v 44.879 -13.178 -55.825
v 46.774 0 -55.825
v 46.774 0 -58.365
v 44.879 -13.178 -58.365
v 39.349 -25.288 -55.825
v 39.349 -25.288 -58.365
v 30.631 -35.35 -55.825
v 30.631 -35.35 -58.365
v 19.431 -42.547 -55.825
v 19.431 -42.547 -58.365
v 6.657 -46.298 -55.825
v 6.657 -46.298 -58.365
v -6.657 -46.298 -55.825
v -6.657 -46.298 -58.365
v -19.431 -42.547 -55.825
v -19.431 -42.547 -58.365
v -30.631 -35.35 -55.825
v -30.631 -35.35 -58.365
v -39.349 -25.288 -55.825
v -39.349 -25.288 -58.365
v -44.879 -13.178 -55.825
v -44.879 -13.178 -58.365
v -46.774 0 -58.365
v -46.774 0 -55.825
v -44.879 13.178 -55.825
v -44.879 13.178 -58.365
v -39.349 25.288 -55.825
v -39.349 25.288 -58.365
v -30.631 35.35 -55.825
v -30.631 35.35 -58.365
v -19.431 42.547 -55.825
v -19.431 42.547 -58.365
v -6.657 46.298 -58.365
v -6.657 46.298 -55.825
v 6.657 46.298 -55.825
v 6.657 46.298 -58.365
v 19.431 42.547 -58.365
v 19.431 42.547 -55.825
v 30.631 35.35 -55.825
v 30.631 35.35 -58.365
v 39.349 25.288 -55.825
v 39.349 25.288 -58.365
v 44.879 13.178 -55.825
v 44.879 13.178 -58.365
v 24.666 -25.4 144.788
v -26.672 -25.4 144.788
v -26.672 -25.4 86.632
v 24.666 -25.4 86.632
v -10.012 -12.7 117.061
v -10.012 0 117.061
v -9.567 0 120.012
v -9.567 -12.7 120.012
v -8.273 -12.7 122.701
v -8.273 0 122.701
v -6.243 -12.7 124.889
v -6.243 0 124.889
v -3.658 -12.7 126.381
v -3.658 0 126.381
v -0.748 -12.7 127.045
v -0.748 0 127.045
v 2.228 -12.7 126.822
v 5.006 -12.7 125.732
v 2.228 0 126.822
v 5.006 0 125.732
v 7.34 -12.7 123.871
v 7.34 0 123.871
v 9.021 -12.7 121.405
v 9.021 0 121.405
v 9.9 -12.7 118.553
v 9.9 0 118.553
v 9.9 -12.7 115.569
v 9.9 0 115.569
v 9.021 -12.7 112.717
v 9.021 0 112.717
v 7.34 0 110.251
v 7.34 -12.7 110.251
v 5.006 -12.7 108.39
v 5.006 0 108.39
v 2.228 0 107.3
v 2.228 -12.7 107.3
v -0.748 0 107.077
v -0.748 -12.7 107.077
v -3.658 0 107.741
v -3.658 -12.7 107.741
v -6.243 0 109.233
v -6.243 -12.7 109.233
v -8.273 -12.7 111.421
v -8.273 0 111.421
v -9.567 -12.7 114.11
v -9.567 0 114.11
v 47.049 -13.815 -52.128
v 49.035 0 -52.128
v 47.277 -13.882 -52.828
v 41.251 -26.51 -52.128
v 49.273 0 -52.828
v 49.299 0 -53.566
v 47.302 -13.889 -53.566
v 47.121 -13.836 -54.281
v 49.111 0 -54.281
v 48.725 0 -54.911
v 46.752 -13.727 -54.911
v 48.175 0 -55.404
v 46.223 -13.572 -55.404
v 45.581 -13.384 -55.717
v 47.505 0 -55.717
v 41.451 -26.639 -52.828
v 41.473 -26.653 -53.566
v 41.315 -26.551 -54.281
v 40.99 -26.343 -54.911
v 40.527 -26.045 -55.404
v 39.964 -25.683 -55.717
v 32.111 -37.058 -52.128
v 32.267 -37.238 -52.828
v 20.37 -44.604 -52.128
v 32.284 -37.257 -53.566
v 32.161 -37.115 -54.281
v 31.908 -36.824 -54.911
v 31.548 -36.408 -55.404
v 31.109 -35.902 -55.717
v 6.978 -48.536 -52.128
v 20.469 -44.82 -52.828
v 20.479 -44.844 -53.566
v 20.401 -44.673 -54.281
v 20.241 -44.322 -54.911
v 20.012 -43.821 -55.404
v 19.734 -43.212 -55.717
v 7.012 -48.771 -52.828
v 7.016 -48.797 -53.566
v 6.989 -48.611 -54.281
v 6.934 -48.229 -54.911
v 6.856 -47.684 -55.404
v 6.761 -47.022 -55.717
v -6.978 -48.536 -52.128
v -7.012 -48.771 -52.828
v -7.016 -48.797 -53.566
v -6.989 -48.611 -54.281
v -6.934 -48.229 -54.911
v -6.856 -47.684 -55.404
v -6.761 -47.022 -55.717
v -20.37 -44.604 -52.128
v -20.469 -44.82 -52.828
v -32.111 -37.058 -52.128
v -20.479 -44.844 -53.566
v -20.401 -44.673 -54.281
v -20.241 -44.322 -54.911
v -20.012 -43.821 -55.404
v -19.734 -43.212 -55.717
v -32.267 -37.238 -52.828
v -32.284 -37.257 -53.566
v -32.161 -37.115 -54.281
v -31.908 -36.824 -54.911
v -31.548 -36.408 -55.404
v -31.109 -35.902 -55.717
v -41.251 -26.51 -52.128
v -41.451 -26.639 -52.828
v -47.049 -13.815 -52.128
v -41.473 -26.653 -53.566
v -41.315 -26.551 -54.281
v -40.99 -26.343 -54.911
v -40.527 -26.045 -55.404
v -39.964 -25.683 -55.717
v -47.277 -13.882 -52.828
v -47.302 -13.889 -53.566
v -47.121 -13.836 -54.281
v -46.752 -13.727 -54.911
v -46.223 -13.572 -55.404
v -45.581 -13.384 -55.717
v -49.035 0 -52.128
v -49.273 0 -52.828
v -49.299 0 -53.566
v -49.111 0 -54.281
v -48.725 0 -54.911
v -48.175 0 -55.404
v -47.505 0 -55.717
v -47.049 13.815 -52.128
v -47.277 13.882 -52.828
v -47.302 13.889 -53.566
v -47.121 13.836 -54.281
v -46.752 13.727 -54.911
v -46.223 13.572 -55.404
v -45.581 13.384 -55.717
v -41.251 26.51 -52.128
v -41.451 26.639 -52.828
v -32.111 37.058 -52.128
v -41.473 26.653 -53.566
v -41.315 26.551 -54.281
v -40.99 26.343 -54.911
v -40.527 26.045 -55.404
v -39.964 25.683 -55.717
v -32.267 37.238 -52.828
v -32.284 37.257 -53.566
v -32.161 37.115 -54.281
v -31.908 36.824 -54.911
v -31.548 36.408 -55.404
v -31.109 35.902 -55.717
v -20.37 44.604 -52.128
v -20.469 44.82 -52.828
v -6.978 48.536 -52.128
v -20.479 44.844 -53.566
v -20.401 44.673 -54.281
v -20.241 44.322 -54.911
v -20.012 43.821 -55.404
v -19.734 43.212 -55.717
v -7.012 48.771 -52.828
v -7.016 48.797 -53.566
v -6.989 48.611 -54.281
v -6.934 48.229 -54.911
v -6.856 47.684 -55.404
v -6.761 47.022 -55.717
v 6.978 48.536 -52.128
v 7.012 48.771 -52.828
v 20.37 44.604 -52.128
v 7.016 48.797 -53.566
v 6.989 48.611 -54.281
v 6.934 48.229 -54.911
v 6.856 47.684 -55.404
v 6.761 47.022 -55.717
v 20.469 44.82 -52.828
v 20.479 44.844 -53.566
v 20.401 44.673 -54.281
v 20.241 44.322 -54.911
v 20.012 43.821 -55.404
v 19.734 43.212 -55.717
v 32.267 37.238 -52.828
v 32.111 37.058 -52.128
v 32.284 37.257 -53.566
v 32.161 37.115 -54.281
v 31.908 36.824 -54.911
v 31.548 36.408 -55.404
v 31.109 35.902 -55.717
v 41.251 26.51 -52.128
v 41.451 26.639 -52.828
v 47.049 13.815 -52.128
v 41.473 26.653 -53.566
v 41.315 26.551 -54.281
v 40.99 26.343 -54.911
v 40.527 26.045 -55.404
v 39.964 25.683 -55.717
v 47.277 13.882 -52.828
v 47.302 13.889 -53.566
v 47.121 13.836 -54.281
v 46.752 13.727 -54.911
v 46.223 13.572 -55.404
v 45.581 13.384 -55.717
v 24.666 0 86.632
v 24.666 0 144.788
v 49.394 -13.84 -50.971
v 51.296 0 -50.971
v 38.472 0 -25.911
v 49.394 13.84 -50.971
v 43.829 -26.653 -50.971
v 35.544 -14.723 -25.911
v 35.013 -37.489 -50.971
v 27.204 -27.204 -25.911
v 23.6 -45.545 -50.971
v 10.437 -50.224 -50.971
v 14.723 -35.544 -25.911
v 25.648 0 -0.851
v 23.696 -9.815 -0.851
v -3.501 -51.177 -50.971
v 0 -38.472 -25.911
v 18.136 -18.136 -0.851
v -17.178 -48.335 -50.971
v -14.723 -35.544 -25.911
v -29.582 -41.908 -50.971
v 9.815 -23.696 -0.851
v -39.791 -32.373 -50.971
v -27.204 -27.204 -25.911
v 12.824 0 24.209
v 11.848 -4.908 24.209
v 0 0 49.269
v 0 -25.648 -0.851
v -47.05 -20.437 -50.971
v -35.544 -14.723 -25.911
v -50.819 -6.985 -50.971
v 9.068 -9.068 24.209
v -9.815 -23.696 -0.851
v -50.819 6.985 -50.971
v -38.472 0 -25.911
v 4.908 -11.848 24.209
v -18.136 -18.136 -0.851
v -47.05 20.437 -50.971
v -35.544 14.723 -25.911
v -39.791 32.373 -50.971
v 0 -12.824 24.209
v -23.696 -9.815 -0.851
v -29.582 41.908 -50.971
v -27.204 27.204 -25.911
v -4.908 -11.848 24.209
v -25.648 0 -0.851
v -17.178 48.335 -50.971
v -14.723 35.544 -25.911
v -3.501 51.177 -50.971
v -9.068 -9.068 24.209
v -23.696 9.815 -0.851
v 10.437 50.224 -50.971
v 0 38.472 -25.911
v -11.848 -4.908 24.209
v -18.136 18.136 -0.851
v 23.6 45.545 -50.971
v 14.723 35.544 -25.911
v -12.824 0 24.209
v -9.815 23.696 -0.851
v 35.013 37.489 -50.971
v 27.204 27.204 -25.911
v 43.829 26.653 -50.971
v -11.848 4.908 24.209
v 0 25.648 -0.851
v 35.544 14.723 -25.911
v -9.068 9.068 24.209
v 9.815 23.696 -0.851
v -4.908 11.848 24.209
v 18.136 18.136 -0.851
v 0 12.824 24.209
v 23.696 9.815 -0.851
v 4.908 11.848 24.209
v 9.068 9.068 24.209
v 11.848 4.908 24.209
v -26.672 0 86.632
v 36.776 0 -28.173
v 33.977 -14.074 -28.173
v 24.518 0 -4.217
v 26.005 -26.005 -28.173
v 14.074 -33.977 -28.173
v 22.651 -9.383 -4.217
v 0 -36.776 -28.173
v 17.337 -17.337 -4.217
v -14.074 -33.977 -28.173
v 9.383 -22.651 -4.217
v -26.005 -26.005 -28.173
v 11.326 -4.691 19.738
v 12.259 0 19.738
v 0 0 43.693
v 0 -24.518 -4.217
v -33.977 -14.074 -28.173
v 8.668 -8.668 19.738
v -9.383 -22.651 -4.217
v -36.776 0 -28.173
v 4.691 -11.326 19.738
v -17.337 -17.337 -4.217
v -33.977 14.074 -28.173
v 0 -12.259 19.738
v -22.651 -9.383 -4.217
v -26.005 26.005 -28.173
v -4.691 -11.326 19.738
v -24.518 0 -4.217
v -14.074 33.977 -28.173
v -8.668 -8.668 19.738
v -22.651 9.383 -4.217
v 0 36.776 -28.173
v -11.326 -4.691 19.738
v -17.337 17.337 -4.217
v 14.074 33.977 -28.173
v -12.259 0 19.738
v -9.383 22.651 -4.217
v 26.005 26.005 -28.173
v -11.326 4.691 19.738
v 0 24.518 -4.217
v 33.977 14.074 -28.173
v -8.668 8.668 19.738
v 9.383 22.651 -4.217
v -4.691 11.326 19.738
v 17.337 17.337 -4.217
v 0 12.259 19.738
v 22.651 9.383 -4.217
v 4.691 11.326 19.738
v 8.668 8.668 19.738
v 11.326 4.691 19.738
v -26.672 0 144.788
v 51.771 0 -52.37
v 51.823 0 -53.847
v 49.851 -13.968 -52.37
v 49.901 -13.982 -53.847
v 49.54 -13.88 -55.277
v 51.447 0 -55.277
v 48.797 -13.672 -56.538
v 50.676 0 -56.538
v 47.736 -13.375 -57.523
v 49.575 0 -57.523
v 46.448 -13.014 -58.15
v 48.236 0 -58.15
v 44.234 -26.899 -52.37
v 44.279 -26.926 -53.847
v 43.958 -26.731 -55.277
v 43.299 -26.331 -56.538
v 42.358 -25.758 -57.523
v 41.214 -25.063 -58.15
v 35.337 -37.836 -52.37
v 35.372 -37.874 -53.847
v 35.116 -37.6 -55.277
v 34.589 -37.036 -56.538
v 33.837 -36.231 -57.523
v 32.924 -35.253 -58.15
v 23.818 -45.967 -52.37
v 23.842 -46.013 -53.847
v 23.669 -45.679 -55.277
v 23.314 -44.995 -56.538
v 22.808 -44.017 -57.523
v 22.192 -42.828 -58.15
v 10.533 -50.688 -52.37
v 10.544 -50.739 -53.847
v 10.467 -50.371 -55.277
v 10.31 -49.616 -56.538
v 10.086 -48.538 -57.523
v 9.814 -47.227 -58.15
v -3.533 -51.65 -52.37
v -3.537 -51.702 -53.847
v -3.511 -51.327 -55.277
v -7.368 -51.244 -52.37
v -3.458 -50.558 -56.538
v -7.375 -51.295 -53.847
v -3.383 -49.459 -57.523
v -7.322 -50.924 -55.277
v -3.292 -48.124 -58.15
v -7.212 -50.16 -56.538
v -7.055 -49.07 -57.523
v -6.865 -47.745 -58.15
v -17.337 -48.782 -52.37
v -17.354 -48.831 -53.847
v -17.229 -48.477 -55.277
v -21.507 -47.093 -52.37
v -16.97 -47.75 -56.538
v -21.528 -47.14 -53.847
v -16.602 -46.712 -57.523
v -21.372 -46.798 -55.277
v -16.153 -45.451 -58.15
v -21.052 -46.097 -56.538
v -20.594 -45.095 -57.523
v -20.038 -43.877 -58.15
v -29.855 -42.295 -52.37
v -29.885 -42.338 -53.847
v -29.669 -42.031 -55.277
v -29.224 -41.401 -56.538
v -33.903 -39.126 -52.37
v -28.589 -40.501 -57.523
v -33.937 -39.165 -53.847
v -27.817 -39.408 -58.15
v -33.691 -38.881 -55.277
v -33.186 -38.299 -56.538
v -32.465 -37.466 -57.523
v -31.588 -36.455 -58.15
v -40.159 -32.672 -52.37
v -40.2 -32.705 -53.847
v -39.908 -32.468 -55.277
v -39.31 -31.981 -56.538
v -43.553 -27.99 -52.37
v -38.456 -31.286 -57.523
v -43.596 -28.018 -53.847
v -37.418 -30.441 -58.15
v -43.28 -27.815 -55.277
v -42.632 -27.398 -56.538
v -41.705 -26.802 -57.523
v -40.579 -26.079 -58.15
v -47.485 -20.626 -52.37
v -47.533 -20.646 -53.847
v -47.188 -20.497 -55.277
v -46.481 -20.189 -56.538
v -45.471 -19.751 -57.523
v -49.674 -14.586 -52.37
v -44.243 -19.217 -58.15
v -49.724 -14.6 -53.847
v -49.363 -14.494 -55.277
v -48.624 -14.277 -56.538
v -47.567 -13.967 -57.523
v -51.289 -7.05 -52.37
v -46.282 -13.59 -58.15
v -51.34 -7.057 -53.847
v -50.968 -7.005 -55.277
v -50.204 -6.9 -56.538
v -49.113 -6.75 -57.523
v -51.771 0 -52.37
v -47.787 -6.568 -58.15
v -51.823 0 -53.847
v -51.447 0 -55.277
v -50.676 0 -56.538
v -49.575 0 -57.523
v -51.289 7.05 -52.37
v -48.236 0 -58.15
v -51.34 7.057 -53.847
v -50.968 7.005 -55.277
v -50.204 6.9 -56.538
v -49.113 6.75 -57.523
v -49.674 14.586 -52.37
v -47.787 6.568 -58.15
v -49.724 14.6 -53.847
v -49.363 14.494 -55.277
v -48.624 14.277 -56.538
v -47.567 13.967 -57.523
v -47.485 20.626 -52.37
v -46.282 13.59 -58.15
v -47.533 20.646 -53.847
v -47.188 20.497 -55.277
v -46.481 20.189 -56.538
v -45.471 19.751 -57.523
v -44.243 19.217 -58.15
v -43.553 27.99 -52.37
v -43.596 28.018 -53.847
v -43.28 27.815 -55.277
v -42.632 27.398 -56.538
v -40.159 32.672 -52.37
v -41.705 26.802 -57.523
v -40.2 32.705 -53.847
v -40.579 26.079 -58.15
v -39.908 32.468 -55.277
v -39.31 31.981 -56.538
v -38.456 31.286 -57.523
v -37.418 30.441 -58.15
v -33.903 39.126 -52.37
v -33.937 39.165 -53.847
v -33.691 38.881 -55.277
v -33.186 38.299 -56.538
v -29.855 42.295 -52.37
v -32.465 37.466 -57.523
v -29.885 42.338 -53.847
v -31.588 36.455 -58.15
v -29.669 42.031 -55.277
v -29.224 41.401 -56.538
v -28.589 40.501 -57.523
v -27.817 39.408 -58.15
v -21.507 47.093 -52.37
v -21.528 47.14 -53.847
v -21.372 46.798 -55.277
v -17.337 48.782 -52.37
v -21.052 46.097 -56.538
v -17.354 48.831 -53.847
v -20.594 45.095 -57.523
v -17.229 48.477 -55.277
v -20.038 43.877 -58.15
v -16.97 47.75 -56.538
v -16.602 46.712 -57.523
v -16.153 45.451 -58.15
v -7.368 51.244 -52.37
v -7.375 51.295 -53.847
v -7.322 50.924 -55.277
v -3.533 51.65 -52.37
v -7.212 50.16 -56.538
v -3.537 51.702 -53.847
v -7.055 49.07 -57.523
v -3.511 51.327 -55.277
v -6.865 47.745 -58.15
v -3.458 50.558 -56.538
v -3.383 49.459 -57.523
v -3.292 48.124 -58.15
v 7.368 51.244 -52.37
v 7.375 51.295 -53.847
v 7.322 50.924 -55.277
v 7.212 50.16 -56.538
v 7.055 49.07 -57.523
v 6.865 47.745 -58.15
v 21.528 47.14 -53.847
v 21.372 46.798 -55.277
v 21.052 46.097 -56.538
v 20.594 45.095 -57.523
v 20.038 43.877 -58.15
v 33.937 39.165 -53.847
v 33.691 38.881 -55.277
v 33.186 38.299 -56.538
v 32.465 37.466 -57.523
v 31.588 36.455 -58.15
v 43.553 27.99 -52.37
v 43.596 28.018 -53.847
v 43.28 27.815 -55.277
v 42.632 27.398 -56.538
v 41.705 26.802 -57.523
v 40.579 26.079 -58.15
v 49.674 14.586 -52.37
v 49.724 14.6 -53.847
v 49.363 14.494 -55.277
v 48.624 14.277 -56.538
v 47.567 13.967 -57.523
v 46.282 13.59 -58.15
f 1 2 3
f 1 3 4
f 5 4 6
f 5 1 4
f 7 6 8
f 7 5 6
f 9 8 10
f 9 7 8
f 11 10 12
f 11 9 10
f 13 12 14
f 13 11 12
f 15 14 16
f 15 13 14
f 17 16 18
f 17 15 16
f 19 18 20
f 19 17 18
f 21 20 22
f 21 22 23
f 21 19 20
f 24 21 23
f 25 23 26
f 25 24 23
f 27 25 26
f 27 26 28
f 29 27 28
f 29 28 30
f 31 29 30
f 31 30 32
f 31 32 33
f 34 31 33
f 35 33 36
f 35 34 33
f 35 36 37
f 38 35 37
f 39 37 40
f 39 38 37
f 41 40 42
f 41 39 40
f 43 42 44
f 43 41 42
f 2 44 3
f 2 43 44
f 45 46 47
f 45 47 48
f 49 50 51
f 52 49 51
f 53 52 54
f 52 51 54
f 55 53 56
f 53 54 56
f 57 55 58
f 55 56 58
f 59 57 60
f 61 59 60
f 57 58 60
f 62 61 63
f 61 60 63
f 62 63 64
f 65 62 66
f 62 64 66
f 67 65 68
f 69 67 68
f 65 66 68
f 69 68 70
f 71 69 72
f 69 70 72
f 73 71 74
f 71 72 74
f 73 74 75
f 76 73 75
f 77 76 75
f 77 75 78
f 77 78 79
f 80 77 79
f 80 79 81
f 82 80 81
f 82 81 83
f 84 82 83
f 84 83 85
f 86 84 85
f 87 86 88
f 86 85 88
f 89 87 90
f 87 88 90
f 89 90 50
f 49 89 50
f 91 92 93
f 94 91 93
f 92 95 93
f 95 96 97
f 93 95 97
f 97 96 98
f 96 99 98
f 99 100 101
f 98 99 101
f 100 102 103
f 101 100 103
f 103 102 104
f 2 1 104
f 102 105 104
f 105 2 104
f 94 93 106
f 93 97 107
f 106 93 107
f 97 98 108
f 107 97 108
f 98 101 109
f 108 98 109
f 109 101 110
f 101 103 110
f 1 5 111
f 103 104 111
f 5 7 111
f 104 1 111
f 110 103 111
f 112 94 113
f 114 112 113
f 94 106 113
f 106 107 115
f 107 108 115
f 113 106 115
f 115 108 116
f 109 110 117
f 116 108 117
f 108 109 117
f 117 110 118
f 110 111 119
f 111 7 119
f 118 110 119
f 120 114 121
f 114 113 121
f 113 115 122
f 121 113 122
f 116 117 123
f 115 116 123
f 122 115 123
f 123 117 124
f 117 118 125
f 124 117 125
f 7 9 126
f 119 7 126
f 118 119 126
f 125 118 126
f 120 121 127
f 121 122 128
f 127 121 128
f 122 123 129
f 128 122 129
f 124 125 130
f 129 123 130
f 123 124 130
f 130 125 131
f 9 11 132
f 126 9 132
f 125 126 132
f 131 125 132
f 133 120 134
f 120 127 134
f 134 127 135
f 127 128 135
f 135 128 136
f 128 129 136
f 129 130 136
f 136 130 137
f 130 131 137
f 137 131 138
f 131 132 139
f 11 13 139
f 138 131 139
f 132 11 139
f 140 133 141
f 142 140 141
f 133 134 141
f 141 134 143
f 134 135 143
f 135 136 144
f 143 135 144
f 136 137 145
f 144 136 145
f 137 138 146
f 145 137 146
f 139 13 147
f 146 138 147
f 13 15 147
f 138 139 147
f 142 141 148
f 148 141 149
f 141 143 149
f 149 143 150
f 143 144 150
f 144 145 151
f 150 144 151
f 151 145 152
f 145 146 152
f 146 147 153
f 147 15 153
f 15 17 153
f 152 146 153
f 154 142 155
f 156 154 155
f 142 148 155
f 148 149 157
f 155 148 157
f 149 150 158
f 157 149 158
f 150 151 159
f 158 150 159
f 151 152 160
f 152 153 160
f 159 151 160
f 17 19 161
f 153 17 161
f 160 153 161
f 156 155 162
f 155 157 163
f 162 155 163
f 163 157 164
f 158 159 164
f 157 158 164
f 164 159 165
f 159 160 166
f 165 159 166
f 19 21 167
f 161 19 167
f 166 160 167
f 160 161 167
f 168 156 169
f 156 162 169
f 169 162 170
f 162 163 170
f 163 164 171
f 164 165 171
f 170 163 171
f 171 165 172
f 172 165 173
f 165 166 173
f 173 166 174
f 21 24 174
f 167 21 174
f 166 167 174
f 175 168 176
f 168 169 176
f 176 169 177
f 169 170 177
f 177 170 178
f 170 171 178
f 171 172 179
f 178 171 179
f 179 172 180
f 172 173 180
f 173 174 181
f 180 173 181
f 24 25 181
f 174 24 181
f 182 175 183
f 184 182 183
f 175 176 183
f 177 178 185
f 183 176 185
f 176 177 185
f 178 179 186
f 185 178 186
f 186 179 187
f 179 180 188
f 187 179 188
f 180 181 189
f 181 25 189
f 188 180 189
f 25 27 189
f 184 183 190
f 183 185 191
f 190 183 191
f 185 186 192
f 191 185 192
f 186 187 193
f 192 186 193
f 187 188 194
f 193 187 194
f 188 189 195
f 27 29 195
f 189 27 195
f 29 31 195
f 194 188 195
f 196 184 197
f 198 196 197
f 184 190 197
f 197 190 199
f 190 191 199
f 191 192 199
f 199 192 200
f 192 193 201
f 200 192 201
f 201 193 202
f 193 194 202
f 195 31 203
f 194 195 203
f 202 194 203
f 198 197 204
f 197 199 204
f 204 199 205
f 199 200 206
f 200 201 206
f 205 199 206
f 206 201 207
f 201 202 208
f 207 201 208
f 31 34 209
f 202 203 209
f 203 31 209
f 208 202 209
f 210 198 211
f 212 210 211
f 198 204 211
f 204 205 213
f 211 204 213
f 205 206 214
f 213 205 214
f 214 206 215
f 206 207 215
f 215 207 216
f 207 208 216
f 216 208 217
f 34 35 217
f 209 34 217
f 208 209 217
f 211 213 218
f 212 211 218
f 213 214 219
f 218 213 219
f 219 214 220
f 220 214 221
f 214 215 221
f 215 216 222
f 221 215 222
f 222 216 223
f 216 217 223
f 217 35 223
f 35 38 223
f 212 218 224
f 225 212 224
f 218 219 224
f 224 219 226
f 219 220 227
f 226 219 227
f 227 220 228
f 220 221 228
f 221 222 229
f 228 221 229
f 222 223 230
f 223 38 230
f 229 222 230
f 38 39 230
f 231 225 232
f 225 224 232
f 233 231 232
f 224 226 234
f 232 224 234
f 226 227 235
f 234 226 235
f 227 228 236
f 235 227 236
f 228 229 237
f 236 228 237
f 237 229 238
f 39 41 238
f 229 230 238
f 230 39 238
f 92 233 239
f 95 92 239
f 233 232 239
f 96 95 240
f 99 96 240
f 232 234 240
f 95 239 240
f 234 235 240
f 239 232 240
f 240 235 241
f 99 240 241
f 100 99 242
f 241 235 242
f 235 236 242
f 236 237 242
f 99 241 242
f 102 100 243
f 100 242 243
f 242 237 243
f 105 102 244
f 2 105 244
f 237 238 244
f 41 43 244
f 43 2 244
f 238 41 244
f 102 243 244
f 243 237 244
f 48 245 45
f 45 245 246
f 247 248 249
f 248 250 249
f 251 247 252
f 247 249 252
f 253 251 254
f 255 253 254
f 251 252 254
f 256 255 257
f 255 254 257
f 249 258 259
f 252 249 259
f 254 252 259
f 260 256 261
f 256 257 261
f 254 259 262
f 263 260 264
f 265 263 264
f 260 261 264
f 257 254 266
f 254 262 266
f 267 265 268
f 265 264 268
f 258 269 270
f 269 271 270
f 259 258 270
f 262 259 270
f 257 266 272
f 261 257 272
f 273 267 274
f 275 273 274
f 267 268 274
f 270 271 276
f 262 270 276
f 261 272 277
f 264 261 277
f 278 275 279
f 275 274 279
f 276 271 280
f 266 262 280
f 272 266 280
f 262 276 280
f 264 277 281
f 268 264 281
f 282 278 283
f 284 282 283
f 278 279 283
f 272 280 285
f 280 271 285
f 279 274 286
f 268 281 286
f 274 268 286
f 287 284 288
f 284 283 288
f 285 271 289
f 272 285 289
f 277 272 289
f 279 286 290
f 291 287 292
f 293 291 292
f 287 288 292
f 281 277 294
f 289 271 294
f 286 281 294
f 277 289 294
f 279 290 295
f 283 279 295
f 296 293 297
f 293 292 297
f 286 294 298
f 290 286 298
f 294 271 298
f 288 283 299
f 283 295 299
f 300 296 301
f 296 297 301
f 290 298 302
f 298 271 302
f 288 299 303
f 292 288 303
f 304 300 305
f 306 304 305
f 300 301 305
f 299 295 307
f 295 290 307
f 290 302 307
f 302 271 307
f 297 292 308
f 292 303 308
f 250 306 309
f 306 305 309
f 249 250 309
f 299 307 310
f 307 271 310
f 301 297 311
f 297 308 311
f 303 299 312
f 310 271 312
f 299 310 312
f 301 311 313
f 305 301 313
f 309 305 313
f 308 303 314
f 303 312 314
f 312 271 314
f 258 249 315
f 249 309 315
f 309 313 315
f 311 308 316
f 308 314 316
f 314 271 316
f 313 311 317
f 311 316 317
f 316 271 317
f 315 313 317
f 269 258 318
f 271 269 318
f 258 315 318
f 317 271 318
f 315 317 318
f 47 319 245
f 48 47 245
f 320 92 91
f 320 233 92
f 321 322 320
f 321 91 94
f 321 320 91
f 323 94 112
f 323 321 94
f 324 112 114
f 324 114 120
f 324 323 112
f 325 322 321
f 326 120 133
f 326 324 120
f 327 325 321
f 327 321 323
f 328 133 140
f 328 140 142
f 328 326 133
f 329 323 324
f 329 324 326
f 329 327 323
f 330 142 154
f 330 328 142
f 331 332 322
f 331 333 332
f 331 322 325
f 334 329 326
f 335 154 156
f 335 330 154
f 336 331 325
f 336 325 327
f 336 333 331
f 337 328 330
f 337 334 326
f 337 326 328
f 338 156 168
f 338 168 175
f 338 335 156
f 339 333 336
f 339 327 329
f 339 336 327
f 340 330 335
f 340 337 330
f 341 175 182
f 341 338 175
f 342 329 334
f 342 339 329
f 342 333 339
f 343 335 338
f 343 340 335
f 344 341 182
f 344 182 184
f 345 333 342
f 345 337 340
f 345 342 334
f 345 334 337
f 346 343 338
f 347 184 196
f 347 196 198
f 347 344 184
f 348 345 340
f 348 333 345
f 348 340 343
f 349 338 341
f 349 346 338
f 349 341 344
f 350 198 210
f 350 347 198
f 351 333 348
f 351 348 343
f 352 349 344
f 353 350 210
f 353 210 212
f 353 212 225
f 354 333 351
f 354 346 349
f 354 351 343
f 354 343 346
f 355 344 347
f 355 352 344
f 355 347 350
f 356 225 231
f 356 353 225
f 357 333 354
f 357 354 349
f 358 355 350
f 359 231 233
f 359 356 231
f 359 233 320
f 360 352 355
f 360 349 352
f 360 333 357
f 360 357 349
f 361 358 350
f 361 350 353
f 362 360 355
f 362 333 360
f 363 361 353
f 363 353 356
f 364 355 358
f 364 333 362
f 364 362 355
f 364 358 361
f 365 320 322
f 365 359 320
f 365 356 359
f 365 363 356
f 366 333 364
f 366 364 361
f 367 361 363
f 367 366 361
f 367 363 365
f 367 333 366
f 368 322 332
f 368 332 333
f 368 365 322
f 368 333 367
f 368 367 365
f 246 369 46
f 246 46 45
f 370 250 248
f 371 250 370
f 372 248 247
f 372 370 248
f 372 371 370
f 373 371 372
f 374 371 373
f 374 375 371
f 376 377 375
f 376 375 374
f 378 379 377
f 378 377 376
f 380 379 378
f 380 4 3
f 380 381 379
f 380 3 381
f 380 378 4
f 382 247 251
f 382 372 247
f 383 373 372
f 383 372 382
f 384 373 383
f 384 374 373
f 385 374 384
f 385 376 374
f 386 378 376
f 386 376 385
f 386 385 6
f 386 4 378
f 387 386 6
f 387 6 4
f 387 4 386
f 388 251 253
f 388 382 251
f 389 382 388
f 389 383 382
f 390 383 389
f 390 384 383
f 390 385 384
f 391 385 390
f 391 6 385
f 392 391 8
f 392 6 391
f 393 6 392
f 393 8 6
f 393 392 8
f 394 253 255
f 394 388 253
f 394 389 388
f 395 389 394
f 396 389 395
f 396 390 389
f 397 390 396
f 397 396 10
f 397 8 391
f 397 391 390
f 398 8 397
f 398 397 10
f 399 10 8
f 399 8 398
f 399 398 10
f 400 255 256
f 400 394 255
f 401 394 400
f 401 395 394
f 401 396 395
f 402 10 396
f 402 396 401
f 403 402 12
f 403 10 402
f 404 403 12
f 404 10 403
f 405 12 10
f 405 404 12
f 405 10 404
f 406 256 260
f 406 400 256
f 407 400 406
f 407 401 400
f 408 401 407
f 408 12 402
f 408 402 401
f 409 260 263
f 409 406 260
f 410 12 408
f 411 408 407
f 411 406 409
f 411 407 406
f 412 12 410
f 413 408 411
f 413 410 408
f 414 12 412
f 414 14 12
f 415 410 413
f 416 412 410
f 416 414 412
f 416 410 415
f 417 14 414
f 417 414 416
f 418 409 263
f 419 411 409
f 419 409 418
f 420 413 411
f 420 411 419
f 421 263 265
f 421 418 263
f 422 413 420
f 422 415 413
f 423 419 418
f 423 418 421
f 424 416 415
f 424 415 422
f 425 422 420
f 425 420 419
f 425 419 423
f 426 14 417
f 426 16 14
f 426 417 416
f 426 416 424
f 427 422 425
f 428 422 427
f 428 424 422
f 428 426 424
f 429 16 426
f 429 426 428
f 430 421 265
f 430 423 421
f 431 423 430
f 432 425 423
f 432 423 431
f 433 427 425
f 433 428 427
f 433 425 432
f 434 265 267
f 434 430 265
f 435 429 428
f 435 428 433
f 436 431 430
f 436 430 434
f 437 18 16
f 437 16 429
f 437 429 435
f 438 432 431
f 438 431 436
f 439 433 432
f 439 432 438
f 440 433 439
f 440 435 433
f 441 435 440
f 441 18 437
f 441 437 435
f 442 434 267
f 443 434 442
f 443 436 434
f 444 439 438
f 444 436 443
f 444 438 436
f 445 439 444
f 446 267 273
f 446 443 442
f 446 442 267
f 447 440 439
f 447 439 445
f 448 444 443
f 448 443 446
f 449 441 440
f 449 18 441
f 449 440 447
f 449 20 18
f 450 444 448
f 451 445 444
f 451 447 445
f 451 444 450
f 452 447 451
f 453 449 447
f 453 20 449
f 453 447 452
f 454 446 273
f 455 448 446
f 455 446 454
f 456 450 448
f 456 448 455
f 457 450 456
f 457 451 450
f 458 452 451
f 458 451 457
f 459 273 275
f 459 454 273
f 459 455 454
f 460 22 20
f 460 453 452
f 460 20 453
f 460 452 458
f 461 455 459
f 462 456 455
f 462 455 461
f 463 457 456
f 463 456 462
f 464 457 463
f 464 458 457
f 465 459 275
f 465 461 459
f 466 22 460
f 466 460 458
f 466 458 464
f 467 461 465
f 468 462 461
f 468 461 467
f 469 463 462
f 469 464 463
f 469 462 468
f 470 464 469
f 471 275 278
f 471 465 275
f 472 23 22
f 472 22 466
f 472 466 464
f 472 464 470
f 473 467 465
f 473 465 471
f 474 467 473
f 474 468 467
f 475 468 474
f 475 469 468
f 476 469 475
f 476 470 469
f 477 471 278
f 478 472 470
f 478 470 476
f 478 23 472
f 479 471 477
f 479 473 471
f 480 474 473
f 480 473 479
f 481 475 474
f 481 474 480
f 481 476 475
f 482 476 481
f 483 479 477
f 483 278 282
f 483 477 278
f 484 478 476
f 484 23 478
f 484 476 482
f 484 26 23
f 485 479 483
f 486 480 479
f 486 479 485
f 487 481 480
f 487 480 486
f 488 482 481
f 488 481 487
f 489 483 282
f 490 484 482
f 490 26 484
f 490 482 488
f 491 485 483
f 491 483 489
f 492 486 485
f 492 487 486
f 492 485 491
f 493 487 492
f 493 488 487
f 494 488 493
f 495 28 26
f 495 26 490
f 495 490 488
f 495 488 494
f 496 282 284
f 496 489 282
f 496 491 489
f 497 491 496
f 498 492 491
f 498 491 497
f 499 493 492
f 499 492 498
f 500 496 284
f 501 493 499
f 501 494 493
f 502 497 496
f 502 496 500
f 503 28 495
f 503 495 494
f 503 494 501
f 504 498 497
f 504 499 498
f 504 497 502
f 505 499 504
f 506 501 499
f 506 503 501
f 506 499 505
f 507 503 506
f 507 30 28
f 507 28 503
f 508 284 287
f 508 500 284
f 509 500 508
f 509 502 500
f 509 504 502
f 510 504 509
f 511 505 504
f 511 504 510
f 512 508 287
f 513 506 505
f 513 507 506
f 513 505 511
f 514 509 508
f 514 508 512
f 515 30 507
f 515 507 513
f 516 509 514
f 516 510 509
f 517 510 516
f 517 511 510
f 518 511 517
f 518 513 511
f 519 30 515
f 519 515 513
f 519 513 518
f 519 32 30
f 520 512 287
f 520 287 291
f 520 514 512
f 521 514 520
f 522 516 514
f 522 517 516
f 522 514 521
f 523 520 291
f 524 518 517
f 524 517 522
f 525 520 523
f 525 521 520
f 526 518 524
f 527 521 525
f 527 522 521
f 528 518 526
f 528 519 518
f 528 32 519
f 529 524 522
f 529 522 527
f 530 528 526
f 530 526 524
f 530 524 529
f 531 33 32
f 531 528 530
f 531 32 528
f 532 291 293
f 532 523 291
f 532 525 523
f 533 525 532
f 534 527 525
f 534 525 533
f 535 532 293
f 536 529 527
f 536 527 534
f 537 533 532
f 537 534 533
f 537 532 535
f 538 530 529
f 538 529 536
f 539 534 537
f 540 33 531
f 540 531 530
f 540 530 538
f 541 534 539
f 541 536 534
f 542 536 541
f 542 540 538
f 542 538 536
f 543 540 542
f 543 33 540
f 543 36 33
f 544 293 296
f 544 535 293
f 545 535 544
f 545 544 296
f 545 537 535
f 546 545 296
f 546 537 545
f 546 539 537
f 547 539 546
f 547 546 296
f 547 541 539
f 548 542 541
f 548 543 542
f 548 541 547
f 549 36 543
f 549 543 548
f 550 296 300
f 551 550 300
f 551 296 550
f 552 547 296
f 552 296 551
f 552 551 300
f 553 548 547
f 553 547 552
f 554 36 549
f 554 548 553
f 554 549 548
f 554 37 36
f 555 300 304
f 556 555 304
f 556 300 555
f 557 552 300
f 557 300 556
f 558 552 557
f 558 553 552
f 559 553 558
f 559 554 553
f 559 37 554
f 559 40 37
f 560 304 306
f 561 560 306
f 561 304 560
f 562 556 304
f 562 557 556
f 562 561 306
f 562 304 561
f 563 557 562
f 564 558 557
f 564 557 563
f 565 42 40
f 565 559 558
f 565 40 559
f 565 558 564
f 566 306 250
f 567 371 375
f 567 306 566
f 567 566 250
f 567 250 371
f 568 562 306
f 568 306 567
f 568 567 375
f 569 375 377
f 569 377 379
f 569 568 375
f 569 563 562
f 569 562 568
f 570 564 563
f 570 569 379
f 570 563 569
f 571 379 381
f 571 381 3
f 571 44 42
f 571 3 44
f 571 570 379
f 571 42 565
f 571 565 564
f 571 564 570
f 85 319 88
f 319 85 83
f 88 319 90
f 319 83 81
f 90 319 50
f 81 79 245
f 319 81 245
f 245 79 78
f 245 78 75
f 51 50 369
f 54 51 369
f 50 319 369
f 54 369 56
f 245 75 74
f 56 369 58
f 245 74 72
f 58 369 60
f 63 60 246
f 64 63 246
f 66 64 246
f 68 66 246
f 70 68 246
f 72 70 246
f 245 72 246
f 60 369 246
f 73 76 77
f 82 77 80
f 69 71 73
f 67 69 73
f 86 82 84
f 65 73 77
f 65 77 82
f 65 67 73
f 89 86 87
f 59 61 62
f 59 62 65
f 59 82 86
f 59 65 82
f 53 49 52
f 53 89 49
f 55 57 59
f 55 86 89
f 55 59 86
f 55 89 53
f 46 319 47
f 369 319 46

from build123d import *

# Parameters (mm, degrees)
F2_W     = 51.3377338648
F2_H     = 58.1560283899
F3_DEPTH = 25.4
F5_R     = 10.0123039363
F6_DEPTH = 12.7
F7_R     = 5.08
F8_T     = -2.54


# Not quite as in the source:
# - a shell that OpenCascade refuses in one call is made with other operations: the cavity is built on its own and cut out


with BuildPart() as f1:
    # F0 (on Front) → F1 (revolve)
    with BuildSketch(Plane.XZ):
        Polygon((55.080331862, -58.3649463952), (0, 49.2691025138), (0, -58.3649463952), align=None)
    revolve(axis=Axis((0, 0, -4.5479219407), (0, 0, -1)))

    # F7
    f7_edges = [f1.edges().sort_by_distance(p)[0] for p in [
        (-55.080332, 0, -58.364946),
    ]]
    fillet(f7_edges, radius=F7_R)

    # F8: a shell. OpenCascade refuses it in one call, so the cavity is built on its own and cut out:
    # the body offset inwards by the wall thickness, plus a prism from it out through each open face.
    f8_core = offset(f1.part, amount=F8_T, mode=Mode.PRIVATE)
    f8_exits = [f8_core.faces().sort_by_distance(p)[0] for p in [
        (0, 0, -55.824946),
    ]]
    add(f8_core, mode=Mode.SUBTRACT)
    extrude(f8_exits, amount=-F8_T, mode=Mode.SUBTRACT)


with BuildPart() as f3:
    # F2 (on Front) → F3 (new body)
    with BuildSketch(Plane.XZ):
        with Locations((-1.0026898235, 115.7104298472)):
            Rectangle(F2_W, F2_H)
    extrude(amount=F3_DEPTH)

    # F5 (on face) → F6 (cut)
    with BuildSketch(Plane(origin=(0, 0, 0), x_dir=(-1, 0, 0), z_dir=(0, 1, 0))):
        with Locations((0, 117.0610040426)):
            Circle(F5_R)
    extrude(amount=-F6_DEPTH, mode=Mode.SUBTRACT)


solid = Compound([f1.part, f3.part])
